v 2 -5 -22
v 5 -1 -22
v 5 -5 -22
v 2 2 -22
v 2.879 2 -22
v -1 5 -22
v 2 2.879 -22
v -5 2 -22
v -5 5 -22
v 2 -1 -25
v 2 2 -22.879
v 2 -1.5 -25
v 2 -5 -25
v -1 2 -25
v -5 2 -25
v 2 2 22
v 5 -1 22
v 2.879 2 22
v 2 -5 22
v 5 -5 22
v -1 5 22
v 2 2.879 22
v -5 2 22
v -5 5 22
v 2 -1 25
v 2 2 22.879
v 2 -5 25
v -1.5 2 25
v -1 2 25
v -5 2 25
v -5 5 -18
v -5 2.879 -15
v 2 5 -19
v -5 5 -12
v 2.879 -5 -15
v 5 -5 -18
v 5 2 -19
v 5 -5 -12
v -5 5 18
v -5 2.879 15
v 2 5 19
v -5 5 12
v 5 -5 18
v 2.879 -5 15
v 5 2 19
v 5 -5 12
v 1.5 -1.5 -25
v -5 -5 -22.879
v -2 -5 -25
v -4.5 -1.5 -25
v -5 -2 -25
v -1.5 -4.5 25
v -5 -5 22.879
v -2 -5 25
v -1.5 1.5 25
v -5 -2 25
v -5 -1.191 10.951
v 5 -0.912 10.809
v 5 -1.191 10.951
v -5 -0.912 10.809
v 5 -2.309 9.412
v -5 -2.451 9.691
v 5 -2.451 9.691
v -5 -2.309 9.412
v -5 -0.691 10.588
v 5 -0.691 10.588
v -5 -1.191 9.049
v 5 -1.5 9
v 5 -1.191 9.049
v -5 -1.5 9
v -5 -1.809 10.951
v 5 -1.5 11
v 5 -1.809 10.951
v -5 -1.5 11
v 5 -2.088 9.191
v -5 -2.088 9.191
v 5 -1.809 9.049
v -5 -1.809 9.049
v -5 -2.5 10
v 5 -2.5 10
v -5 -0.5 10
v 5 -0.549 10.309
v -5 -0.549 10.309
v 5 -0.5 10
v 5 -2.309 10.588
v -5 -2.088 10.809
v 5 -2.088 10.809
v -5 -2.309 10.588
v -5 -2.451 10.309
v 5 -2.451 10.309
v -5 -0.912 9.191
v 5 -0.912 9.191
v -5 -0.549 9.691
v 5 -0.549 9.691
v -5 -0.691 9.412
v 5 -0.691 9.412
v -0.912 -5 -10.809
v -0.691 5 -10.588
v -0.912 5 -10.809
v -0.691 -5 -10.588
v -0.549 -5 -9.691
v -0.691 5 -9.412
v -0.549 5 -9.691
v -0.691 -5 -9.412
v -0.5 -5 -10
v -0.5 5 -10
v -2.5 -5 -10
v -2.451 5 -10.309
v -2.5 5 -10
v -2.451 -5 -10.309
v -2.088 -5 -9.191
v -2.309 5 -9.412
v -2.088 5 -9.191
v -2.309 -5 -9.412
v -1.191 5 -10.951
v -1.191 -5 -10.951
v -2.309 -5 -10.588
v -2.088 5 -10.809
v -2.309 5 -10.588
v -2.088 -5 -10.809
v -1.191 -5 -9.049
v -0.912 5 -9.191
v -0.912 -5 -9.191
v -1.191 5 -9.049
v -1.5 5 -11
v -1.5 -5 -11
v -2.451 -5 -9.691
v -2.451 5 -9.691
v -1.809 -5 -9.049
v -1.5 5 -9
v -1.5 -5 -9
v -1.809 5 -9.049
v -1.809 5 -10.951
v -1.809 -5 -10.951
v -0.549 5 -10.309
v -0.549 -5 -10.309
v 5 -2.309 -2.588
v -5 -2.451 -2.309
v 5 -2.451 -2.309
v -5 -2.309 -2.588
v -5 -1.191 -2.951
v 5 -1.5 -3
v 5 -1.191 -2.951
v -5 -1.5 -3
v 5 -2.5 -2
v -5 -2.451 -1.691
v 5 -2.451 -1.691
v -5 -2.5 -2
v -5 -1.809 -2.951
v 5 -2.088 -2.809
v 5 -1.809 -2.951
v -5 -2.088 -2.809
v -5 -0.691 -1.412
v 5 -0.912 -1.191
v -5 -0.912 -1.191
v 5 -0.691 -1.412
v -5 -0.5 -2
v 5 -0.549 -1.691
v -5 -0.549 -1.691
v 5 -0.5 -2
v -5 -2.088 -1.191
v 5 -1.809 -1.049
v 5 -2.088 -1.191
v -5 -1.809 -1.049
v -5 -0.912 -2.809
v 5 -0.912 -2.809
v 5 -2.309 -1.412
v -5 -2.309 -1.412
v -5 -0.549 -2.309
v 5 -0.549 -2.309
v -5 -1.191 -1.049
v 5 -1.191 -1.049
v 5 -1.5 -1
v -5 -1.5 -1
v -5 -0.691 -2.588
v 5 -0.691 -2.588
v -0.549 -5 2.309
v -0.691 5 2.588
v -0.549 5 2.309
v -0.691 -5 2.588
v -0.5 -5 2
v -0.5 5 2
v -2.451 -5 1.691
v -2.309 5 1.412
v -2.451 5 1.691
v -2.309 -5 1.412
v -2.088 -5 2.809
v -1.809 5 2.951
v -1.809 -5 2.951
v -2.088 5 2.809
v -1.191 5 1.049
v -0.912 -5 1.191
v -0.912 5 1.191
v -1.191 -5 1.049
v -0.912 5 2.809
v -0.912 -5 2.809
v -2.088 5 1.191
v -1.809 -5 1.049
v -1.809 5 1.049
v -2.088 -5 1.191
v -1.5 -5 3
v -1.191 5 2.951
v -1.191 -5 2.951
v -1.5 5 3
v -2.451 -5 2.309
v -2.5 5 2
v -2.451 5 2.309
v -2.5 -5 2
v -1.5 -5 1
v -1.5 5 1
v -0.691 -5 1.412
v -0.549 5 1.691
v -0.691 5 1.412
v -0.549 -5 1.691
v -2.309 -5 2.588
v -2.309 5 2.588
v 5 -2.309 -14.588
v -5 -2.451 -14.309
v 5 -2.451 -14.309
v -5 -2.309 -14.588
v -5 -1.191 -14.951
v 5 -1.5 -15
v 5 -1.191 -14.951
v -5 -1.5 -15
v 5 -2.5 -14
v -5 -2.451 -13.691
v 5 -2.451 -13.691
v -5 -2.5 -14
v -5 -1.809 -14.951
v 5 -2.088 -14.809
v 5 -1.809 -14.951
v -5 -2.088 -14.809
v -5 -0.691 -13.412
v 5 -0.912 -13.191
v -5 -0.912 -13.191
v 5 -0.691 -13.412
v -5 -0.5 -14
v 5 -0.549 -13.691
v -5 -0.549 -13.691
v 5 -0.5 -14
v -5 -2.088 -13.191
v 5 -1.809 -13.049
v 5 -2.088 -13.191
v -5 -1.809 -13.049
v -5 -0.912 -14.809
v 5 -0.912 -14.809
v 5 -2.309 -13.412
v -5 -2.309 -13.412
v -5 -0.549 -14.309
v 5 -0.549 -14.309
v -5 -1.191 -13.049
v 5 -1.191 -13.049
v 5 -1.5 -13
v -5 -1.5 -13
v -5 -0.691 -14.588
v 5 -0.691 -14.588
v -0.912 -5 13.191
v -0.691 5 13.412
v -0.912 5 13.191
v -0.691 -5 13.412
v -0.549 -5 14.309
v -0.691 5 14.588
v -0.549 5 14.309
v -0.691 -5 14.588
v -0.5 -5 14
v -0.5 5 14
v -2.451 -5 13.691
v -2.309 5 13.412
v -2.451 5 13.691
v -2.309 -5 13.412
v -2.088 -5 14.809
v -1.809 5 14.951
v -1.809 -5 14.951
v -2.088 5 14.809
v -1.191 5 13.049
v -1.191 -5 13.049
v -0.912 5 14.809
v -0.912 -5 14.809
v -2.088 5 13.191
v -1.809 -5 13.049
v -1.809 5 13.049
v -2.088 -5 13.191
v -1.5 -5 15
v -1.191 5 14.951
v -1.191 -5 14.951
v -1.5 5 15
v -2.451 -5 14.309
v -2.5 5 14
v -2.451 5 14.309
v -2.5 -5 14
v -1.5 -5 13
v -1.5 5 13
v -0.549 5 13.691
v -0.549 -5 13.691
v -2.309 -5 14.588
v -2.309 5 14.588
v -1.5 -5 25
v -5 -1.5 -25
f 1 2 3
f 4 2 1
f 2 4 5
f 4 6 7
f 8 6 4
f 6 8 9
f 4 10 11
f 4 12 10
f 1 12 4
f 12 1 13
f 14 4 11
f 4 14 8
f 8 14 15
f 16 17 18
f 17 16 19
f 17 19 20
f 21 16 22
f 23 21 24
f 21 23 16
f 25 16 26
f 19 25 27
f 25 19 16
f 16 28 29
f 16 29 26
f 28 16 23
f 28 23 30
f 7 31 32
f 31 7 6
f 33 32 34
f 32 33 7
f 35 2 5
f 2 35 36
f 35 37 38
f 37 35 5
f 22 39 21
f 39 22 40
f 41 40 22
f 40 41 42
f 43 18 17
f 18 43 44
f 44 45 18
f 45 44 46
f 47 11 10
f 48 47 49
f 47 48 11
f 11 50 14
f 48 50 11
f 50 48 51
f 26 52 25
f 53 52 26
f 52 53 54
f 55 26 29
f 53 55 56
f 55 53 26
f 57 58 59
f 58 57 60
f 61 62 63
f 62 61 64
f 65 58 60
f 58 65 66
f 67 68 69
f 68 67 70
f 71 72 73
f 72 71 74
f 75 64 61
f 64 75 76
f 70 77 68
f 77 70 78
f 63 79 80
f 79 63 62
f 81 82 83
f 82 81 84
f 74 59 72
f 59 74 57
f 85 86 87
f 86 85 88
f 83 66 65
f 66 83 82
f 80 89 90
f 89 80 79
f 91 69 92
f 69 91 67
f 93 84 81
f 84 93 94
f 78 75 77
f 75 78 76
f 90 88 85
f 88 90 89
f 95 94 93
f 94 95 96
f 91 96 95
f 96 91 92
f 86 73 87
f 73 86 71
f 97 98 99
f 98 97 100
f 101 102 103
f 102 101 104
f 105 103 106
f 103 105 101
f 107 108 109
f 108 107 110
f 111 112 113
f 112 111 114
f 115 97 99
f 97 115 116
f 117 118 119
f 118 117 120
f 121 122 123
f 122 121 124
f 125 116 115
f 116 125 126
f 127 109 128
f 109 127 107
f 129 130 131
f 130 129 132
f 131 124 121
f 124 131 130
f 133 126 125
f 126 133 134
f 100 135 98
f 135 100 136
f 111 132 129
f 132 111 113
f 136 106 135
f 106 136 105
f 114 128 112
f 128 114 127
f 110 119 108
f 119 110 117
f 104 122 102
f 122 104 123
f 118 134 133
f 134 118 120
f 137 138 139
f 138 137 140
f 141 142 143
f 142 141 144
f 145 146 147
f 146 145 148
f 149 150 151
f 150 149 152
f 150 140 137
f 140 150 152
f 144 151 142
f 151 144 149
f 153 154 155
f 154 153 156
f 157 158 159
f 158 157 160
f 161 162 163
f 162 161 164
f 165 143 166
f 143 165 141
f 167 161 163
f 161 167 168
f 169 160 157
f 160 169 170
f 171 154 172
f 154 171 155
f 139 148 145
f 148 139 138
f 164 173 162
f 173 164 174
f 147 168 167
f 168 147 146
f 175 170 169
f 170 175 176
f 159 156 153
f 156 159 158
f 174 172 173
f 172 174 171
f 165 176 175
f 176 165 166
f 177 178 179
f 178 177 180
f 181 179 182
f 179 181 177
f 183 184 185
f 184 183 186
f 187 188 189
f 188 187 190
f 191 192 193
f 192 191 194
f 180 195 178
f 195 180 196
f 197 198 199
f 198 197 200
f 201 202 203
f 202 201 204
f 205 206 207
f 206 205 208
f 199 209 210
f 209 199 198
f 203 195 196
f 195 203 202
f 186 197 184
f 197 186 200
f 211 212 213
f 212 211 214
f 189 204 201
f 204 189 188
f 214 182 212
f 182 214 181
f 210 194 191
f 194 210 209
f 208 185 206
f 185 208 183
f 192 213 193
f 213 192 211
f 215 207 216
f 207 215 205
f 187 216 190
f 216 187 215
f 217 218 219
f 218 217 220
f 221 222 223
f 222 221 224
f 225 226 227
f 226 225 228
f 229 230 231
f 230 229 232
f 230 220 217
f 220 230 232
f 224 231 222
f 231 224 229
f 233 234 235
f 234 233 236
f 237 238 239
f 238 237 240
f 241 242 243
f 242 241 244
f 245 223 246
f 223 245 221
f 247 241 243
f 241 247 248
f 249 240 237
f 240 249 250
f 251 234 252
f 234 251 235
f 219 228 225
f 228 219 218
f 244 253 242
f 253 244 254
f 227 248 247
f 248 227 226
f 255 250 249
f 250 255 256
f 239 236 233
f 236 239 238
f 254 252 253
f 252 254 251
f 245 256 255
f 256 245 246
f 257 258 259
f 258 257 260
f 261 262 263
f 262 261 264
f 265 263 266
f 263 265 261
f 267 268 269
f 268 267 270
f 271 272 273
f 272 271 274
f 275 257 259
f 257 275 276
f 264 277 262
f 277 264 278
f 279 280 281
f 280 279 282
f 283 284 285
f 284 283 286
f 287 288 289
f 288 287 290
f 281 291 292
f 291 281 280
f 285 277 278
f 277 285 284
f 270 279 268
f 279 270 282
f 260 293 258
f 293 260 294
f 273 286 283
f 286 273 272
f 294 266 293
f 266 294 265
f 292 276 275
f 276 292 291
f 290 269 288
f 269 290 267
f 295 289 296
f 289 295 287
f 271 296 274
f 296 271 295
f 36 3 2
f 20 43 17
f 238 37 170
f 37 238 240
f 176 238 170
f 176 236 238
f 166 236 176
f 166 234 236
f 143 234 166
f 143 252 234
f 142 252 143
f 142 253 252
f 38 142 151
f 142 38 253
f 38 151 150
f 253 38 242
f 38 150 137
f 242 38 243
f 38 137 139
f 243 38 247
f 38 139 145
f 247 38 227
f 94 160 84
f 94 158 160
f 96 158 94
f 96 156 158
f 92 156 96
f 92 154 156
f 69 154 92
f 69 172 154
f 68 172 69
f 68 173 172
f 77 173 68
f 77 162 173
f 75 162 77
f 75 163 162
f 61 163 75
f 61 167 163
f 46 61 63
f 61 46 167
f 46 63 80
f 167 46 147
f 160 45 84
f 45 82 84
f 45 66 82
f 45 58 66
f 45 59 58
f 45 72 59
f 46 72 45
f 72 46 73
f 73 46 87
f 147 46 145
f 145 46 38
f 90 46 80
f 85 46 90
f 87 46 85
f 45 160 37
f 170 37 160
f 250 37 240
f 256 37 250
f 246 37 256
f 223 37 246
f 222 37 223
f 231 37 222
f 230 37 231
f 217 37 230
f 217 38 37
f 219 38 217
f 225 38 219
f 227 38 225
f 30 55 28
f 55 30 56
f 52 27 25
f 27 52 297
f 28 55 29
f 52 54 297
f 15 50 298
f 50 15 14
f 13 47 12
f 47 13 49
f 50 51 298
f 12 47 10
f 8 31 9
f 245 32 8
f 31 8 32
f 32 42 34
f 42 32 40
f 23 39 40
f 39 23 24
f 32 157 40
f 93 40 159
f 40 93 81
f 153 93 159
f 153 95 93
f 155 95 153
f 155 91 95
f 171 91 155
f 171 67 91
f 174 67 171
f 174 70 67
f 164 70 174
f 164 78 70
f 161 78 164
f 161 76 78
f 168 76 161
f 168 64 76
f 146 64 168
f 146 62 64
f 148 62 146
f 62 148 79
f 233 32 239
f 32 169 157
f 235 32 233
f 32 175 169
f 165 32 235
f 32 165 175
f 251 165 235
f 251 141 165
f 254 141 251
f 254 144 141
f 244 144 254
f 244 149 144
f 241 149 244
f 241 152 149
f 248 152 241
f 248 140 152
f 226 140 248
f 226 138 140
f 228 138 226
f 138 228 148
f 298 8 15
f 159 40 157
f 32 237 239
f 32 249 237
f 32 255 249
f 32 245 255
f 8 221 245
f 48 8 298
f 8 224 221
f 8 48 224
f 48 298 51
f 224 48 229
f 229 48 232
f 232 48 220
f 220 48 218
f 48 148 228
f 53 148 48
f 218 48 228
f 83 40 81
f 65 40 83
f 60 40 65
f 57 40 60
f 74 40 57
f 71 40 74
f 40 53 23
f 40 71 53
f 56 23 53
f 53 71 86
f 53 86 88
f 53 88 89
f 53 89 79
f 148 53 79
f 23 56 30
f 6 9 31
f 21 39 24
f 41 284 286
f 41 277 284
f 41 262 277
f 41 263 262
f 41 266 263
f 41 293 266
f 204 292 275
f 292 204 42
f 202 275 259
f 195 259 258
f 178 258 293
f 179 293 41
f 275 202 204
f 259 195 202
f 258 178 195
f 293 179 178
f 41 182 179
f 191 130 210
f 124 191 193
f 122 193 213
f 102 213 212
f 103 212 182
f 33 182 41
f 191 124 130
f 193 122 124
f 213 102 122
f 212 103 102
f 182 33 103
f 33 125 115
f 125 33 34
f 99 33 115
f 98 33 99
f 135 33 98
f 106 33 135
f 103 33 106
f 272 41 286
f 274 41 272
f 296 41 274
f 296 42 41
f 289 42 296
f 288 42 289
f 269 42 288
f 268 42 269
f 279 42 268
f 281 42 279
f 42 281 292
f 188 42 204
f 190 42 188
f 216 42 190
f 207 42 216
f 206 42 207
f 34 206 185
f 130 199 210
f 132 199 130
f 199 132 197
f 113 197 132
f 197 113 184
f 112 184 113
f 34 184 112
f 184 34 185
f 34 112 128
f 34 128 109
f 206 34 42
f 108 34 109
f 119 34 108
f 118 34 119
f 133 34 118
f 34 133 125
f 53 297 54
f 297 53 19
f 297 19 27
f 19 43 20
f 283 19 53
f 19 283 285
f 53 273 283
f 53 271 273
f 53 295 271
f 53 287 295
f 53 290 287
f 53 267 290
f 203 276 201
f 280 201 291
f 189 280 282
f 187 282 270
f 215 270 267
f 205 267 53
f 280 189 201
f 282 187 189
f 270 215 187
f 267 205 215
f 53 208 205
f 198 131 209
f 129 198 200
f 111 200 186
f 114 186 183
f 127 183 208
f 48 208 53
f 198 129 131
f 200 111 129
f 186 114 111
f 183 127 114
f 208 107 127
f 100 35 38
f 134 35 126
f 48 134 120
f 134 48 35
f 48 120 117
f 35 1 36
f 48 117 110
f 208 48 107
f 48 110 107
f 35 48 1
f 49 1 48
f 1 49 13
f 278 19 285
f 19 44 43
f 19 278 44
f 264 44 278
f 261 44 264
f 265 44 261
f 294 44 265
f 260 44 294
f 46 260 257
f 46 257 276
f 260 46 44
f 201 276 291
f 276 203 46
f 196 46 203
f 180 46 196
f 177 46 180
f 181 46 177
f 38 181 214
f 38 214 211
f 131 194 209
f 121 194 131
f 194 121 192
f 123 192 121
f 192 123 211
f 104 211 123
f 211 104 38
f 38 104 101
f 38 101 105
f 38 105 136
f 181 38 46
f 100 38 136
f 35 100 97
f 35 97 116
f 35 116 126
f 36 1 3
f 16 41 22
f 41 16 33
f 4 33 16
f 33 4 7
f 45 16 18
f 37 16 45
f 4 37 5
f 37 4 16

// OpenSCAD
seam=10;
gauze=3;
length=50;
self_tap_dia=2;
hole_pitch=12;

difference()
{
	cube([seam,seam,length],center=true);
	translate([seam/2-gauze/2+0.5, seam/2-gauze/2+0.5, 0])
		cube([gauze+1,gauze+1,length+1],center=true);

	for(i=[-1,1])
	{
		translate([seam/2-gauze/2+0.5, 0, i*(length/2-gauze/2+0.5)])
			cube([gauze+1,length+1,gauze+1],center=true);
		translate([0, seam/2-gauze/2+0.5, i*(length/2-gauze/2+0.5)])
			cube([length+1, gauze+1,gauze+1],center=true);
	}

	for(i=[-1,1])
	{
		translate([seam/2, seam/2, i*length/2])
		rotate([0,i*45,0])
			rotate([0,0,45])
				cube([gauze,gauze,length],center=true);
		translate([seam/2, seam/2, i*length/2])
		rotate([-i*45,0,0])
			rotate([0,0,45])
				cube([gauze,gauze,length],center=true);	
	}

	for(i=[-1,1])
	translate([0, 0, i*length/2])
	rotate([-45,90,0])
		rotate([0,0,45])
			cube([gauze,gauze,length],center=true);

	for(i=[1:floor(length/hole_pitch)])
	{
		translate([0, -gauze/2, length/2 - (i+0.25)*hole_pitch])
			rotate([0,90,0])
				cylinder(r=self_tap_dia/2,h=length,center=true,$fn=20);
		translate([-gauze/2, 0, -length/2 + (i+0.25)*hole_pitch])
			rotate([90,0,0])
				cylinder(r=self_tap_dia/2,h=length,center=true,$fn=20);

	}
}
